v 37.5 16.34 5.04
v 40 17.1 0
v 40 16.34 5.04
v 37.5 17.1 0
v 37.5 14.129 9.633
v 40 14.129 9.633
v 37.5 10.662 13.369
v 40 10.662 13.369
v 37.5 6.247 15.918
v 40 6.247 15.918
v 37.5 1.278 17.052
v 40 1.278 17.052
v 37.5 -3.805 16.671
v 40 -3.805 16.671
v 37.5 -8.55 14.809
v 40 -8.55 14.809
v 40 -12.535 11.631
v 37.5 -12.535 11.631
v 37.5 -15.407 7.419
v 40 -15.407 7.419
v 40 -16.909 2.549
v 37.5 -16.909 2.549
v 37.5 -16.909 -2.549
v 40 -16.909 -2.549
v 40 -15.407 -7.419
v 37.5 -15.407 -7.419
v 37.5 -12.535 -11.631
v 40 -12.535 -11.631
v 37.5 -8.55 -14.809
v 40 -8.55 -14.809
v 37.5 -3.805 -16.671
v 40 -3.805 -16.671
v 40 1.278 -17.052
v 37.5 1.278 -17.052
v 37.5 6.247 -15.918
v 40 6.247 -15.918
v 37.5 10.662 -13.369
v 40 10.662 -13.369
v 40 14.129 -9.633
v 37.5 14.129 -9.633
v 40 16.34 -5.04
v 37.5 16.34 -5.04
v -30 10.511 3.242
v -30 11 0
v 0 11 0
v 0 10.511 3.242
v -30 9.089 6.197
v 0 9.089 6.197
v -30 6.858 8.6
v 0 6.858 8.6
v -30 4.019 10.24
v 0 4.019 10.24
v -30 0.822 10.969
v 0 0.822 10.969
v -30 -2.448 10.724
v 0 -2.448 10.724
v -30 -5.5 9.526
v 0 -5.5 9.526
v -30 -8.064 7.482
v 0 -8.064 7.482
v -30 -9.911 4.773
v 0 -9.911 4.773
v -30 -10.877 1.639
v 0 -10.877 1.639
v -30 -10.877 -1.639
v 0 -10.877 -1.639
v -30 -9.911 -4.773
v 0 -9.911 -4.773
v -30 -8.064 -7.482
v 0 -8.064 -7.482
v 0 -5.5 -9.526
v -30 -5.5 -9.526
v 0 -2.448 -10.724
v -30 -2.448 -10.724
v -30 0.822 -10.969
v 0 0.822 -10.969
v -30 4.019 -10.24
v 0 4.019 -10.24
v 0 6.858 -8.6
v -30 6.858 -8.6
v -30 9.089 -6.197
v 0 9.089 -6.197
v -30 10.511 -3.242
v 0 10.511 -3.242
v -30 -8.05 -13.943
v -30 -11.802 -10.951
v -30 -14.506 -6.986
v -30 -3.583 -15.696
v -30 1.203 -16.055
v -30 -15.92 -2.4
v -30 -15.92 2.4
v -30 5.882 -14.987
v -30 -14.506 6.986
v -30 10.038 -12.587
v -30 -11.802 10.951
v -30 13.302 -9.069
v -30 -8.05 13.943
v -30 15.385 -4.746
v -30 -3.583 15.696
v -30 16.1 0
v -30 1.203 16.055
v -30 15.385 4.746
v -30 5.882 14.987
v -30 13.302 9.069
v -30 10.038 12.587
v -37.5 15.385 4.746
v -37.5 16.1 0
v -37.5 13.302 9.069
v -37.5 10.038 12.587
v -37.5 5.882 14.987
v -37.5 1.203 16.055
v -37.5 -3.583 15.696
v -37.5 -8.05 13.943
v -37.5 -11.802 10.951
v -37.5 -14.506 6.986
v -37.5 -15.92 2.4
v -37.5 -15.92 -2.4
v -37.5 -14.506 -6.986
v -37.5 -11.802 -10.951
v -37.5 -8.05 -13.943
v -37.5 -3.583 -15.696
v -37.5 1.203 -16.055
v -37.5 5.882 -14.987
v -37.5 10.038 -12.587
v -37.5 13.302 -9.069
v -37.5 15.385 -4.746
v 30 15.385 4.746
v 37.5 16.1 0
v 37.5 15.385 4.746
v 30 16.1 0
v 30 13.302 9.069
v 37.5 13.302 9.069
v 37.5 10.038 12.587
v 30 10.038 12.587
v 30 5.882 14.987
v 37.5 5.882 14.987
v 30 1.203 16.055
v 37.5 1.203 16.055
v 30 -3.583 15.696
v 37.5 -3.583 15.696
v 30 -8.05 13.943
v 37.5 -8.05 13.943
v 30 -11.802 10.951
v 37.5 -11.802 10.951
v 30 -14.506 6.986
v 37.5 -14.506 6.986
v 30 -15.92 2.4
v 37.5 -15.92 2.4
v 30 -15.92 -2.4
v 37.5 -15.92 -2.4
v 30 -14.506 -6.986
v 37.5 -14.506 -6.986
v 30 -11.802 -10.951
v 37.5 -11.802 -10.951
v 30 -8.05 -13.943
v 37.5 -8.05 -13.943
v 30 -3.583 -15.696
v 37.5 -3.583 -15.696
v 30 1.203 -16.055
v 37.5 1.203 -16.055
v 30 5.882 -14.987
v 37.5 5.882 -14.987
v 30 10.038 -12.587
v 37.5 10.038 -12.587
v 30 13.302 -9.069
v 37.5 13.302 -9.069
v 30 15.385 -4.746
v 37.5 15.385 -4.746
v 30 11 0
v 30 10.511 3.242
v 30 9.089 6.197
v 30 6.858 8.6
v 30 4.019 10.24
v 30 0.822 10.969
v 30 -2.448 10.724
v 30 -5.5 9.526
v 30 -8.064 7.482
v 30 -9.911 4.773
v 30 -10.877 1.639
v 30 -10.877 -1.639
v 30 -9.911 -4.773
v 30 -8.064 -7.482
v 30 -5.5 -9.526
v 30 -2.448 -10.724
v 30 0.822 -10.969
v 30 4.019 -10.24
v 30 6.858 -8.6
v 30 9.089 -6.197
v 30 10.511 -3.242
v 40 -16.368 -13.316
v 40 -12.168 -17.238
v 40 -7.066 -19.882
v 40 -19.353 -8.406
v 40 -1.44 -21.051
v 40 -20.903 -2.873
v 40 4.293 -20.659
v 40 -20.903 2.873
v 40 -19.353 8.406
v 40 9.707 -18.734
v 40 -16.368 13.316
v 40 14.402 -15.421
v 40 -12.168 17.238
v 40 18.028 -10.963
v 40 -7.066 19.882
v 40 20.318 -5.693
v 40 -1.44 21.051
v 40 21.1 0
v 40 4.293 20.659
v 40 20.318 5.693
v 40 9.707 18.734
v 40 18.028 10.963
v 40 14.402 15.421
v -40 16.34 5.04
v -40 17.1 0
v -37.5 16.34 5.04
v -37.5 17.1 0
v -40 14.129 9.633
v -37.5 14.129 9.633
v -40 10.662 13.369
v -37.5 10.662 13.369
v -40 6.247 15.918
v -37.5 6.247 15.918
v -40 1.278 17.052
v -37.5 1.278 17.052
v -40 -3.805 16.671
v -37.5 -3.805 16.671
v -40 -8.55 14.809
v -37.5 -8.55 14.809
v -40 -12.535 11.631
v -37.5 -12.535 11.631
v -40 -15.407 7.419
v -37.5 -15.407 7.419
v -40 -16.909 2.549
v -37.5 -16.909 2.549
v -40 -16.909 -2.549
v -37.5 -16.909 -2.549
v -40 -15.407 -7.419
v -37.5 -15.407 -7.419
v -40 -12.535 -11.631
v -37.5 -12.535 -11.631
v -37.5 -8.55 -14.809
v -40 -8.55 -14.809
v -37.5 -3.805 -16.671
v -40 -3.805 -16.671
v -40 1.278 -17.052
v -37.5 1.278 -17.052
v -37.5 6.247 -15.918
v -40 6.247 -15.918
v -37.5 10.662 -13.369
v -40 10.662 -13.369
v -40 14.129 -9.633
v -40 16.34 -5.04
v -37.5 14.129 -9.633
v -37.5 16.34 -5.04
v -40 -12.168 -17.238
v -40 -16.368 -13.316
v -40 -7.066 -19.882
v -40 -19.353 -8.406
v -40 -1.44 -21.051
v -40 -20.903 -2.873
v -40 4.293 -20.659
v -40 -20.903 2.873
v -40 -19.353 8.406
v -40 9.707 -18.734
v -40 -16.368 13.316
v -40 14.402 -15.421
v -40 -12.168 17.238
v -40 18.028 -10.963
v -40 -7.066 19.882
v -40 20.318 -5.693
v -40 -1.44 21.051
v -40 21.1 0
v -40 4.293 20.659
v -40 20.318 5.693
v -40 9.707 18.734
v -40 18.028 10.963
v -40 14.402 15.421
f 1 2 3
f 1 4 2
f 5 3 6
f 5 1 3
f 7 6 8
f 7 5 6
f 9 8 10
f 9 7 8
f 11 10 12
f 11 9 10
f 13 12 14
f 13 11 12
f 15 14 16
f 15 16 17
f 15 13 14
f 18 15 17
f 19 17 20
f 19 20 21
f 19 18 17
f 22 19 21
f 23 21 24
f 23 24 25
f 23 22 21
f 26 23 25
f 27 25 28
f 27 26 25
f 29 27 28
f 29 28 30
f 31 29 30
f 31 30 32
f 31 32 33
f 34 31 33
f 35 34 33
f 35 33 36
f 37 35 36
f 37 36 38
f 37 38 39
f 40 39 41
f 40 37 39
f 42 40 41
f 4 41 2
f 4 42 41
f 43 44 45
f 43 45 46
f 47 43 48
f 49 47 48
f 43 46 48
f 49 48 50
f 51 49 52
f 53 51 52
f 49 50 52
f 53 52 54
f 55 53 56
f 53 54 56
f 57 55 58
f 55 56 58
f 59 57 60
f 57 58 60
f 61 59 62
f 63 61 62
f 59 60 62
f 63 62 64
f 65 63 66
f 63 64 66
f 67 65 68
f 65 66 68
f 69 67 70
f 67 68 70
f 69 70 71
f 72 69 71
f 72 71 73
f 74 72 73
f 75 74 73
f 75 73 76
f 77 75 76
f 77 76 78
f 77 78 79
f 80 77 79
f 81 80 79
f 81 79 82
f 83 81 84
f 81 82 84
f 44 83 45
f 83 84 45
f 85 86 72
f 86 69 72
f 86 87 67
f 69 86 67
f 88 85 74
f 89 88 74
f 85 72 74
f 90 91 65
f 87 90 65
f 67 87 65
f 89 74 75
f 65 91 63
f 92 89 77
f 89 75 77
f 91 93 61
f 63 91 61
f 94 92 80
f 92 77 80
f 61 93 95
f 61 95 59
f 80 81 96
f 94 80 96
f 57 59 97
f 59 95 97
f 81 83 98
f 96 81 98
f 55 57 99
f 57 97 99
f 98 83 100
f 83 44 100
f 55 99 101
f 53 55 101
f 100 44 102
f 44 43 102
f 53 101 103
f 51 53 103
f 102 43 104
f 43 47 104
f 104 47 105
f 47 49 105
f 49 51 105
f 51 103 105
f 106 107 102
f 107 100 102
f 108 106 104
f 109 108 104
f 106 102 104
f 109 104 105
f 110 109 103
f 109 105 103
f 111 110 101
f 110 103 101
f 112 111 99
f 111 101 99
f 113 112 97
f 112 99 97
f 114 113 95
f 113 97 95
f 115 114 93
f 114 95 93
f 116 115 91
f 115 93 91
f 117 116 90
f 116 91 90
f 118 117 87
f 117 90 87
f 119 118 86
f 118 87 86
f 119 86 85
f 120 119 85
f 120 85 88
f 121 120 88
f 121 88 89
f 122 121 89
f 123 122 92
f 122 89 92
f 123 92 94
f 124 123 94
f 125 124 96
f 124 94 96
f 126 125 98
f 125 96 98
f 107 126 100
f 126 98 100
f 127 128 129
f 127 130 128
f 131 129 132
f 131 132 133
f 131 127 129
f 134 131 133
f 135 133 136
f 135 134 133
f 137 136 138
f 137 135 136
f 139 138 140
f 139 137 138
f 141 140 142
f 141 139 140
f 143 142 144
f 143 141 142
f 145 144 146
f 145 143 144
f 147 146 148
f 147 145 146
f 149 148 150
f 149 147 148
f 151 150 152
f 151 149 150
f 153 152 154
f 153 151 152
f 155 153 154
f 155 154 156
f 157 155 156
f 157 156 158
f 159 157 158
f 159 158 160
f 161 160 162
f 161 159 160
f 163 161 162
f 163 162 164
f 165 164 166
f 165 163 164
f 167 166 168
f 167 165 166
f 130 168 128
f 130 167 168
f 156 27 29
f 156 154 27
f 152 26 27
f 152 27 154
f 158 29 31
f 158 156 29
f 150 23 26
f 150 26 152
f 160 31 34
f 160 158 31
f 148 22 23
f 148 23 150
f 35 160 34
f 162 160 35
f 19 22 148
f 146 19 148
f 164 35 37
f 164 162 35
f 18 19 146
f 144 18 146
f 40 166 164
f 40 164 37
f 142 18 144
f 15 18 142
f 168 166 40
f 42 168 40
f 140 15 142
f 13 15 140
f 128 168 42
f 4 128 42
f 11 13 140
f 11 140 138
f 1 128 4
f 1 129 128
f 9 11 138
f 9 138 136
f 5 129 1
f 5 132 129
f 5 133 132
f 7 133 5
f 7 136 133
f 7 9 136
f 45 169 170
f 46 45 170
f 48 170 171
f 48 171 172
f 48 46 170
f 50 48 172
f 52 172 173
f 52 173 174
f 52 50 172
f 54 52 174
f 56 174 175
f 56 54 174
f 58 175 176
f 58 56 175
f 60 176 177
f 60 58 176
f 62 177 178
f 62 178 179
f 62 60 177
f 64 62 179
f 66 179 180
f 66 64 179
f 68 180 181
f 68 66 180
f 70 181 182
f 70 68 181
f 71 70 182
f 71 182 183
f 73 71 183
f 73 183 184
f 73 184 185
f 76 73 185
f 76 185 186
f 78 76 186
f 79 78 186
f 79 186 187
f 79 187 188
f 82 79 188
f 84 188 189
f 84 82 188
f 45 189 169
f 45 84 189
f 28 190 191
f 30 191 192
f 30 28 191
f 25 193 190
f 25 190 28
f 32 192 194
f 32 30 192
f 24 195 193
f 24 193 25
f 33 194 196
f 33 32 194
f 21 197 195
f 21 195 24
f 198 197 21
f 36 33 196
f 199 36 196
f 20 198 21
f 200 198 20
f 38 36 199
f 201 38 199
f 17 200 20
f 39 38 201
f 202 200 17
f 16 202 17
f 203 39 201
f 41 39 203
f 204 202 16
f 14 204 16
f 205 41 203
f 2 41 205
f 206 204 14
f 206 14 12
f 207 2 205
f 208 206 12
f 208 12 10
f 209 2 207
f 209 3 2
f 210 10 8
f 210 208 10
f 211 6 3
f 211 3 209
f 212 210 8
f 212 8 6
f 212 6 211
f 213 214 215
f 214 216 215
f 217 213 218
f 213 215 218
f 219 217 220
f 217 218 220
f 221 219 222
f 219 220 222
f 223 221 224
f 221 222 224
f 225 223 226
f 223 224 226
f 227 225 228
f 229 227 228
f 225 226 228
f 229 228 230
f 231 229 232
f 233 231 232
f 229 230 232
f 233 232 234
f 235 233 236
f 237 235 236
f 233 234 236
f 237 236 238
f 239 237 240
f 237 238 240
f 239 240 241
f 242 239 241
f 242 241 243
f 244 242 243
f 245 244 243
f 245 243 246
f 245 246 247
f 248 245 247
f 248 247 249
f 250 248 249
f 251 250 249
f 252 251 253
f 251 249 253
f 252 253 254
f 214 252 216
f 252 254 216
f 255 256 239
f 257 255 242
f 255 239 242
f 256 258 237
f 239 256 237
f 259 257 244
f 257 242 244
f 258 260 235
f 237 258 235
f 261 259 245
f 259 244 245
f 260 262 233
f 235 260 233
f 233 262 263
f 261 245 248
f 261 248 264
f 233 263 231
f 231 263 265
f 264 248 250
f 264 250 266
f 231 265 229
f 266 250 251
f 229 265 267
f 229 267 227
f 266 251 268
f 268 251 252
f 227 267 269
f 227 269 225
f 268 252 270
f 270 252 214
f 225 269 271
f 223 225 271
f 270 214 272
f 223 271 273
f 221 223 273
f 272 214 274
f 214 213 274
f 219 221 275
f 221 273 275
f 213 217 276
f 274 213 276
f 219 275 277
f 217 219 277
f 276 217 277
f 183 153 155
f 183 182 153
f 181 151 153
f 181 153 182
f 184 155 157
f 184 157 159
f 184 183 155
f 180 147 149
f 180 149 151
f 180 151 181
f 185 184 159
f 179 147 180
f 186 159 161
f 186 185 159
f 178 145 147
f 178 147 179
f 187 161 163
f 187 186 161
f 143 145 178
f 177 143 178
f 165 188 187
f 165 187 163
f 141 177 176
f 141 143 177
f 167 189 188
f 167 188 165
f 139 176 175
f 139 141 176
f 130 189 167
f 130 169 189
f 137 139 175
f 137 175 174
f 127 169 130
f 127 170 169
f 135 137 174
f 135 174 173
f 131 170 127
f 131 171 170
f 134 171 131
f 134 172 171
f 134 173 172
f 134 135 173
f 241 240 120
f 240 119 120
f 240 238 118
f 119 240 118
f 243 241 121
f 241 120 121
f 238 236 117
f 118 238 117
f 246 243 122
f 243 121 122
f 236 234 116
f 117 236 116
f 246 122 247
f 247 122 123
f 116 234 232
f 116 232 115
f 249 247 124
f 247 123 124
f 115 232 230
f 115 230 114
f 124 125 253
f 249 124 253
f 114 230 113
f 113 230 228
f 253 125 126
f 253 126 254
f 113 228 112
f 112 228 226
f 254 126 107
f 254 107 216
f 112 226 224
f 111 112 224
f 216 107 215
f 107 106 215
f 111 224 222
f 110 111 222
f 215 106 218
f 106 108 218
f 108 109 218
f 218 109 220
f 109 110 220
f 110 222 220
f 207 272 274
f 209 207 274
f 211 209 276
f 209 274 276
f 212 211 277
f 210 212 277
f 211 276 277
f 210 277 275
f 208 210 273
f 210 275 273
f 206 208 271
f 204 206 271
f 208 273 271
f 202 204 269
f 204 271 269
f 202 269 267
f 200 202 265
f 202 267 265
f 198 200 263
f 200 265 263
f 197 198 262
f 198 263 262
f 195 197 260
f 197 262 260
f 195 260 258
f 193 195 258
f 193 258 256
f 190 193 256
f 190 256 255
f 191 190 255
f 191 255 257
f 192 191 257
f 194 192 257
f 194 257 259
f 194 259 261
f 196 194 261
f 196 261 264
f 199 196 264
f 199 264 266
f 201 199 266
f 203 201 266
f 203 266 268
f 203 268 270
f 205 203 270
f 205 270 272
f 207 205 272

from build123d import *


with BuildPart() as part:
    # Sketch1 → Revolve1 (revolve)
    with BuildSketch(Plane.XY):
        Polygon((0, 21.1), (40, 21.1), (40, 17.1), (37.5, 17.1), (37.5, 16.1), (30, 16.1), (30, 11), (0, 11), align=None)
    revolve1 = revolve(axis=Axis((0, 0, 0), (1, 0, 0)))

    # Mirror1: Revolve1 across plane
    add(revolve1.mirror(Plane(origin=(0, 0, 0), x_dir=(0, 0, 1), z_dir=(1, 0, 0))))


solid = part.part
